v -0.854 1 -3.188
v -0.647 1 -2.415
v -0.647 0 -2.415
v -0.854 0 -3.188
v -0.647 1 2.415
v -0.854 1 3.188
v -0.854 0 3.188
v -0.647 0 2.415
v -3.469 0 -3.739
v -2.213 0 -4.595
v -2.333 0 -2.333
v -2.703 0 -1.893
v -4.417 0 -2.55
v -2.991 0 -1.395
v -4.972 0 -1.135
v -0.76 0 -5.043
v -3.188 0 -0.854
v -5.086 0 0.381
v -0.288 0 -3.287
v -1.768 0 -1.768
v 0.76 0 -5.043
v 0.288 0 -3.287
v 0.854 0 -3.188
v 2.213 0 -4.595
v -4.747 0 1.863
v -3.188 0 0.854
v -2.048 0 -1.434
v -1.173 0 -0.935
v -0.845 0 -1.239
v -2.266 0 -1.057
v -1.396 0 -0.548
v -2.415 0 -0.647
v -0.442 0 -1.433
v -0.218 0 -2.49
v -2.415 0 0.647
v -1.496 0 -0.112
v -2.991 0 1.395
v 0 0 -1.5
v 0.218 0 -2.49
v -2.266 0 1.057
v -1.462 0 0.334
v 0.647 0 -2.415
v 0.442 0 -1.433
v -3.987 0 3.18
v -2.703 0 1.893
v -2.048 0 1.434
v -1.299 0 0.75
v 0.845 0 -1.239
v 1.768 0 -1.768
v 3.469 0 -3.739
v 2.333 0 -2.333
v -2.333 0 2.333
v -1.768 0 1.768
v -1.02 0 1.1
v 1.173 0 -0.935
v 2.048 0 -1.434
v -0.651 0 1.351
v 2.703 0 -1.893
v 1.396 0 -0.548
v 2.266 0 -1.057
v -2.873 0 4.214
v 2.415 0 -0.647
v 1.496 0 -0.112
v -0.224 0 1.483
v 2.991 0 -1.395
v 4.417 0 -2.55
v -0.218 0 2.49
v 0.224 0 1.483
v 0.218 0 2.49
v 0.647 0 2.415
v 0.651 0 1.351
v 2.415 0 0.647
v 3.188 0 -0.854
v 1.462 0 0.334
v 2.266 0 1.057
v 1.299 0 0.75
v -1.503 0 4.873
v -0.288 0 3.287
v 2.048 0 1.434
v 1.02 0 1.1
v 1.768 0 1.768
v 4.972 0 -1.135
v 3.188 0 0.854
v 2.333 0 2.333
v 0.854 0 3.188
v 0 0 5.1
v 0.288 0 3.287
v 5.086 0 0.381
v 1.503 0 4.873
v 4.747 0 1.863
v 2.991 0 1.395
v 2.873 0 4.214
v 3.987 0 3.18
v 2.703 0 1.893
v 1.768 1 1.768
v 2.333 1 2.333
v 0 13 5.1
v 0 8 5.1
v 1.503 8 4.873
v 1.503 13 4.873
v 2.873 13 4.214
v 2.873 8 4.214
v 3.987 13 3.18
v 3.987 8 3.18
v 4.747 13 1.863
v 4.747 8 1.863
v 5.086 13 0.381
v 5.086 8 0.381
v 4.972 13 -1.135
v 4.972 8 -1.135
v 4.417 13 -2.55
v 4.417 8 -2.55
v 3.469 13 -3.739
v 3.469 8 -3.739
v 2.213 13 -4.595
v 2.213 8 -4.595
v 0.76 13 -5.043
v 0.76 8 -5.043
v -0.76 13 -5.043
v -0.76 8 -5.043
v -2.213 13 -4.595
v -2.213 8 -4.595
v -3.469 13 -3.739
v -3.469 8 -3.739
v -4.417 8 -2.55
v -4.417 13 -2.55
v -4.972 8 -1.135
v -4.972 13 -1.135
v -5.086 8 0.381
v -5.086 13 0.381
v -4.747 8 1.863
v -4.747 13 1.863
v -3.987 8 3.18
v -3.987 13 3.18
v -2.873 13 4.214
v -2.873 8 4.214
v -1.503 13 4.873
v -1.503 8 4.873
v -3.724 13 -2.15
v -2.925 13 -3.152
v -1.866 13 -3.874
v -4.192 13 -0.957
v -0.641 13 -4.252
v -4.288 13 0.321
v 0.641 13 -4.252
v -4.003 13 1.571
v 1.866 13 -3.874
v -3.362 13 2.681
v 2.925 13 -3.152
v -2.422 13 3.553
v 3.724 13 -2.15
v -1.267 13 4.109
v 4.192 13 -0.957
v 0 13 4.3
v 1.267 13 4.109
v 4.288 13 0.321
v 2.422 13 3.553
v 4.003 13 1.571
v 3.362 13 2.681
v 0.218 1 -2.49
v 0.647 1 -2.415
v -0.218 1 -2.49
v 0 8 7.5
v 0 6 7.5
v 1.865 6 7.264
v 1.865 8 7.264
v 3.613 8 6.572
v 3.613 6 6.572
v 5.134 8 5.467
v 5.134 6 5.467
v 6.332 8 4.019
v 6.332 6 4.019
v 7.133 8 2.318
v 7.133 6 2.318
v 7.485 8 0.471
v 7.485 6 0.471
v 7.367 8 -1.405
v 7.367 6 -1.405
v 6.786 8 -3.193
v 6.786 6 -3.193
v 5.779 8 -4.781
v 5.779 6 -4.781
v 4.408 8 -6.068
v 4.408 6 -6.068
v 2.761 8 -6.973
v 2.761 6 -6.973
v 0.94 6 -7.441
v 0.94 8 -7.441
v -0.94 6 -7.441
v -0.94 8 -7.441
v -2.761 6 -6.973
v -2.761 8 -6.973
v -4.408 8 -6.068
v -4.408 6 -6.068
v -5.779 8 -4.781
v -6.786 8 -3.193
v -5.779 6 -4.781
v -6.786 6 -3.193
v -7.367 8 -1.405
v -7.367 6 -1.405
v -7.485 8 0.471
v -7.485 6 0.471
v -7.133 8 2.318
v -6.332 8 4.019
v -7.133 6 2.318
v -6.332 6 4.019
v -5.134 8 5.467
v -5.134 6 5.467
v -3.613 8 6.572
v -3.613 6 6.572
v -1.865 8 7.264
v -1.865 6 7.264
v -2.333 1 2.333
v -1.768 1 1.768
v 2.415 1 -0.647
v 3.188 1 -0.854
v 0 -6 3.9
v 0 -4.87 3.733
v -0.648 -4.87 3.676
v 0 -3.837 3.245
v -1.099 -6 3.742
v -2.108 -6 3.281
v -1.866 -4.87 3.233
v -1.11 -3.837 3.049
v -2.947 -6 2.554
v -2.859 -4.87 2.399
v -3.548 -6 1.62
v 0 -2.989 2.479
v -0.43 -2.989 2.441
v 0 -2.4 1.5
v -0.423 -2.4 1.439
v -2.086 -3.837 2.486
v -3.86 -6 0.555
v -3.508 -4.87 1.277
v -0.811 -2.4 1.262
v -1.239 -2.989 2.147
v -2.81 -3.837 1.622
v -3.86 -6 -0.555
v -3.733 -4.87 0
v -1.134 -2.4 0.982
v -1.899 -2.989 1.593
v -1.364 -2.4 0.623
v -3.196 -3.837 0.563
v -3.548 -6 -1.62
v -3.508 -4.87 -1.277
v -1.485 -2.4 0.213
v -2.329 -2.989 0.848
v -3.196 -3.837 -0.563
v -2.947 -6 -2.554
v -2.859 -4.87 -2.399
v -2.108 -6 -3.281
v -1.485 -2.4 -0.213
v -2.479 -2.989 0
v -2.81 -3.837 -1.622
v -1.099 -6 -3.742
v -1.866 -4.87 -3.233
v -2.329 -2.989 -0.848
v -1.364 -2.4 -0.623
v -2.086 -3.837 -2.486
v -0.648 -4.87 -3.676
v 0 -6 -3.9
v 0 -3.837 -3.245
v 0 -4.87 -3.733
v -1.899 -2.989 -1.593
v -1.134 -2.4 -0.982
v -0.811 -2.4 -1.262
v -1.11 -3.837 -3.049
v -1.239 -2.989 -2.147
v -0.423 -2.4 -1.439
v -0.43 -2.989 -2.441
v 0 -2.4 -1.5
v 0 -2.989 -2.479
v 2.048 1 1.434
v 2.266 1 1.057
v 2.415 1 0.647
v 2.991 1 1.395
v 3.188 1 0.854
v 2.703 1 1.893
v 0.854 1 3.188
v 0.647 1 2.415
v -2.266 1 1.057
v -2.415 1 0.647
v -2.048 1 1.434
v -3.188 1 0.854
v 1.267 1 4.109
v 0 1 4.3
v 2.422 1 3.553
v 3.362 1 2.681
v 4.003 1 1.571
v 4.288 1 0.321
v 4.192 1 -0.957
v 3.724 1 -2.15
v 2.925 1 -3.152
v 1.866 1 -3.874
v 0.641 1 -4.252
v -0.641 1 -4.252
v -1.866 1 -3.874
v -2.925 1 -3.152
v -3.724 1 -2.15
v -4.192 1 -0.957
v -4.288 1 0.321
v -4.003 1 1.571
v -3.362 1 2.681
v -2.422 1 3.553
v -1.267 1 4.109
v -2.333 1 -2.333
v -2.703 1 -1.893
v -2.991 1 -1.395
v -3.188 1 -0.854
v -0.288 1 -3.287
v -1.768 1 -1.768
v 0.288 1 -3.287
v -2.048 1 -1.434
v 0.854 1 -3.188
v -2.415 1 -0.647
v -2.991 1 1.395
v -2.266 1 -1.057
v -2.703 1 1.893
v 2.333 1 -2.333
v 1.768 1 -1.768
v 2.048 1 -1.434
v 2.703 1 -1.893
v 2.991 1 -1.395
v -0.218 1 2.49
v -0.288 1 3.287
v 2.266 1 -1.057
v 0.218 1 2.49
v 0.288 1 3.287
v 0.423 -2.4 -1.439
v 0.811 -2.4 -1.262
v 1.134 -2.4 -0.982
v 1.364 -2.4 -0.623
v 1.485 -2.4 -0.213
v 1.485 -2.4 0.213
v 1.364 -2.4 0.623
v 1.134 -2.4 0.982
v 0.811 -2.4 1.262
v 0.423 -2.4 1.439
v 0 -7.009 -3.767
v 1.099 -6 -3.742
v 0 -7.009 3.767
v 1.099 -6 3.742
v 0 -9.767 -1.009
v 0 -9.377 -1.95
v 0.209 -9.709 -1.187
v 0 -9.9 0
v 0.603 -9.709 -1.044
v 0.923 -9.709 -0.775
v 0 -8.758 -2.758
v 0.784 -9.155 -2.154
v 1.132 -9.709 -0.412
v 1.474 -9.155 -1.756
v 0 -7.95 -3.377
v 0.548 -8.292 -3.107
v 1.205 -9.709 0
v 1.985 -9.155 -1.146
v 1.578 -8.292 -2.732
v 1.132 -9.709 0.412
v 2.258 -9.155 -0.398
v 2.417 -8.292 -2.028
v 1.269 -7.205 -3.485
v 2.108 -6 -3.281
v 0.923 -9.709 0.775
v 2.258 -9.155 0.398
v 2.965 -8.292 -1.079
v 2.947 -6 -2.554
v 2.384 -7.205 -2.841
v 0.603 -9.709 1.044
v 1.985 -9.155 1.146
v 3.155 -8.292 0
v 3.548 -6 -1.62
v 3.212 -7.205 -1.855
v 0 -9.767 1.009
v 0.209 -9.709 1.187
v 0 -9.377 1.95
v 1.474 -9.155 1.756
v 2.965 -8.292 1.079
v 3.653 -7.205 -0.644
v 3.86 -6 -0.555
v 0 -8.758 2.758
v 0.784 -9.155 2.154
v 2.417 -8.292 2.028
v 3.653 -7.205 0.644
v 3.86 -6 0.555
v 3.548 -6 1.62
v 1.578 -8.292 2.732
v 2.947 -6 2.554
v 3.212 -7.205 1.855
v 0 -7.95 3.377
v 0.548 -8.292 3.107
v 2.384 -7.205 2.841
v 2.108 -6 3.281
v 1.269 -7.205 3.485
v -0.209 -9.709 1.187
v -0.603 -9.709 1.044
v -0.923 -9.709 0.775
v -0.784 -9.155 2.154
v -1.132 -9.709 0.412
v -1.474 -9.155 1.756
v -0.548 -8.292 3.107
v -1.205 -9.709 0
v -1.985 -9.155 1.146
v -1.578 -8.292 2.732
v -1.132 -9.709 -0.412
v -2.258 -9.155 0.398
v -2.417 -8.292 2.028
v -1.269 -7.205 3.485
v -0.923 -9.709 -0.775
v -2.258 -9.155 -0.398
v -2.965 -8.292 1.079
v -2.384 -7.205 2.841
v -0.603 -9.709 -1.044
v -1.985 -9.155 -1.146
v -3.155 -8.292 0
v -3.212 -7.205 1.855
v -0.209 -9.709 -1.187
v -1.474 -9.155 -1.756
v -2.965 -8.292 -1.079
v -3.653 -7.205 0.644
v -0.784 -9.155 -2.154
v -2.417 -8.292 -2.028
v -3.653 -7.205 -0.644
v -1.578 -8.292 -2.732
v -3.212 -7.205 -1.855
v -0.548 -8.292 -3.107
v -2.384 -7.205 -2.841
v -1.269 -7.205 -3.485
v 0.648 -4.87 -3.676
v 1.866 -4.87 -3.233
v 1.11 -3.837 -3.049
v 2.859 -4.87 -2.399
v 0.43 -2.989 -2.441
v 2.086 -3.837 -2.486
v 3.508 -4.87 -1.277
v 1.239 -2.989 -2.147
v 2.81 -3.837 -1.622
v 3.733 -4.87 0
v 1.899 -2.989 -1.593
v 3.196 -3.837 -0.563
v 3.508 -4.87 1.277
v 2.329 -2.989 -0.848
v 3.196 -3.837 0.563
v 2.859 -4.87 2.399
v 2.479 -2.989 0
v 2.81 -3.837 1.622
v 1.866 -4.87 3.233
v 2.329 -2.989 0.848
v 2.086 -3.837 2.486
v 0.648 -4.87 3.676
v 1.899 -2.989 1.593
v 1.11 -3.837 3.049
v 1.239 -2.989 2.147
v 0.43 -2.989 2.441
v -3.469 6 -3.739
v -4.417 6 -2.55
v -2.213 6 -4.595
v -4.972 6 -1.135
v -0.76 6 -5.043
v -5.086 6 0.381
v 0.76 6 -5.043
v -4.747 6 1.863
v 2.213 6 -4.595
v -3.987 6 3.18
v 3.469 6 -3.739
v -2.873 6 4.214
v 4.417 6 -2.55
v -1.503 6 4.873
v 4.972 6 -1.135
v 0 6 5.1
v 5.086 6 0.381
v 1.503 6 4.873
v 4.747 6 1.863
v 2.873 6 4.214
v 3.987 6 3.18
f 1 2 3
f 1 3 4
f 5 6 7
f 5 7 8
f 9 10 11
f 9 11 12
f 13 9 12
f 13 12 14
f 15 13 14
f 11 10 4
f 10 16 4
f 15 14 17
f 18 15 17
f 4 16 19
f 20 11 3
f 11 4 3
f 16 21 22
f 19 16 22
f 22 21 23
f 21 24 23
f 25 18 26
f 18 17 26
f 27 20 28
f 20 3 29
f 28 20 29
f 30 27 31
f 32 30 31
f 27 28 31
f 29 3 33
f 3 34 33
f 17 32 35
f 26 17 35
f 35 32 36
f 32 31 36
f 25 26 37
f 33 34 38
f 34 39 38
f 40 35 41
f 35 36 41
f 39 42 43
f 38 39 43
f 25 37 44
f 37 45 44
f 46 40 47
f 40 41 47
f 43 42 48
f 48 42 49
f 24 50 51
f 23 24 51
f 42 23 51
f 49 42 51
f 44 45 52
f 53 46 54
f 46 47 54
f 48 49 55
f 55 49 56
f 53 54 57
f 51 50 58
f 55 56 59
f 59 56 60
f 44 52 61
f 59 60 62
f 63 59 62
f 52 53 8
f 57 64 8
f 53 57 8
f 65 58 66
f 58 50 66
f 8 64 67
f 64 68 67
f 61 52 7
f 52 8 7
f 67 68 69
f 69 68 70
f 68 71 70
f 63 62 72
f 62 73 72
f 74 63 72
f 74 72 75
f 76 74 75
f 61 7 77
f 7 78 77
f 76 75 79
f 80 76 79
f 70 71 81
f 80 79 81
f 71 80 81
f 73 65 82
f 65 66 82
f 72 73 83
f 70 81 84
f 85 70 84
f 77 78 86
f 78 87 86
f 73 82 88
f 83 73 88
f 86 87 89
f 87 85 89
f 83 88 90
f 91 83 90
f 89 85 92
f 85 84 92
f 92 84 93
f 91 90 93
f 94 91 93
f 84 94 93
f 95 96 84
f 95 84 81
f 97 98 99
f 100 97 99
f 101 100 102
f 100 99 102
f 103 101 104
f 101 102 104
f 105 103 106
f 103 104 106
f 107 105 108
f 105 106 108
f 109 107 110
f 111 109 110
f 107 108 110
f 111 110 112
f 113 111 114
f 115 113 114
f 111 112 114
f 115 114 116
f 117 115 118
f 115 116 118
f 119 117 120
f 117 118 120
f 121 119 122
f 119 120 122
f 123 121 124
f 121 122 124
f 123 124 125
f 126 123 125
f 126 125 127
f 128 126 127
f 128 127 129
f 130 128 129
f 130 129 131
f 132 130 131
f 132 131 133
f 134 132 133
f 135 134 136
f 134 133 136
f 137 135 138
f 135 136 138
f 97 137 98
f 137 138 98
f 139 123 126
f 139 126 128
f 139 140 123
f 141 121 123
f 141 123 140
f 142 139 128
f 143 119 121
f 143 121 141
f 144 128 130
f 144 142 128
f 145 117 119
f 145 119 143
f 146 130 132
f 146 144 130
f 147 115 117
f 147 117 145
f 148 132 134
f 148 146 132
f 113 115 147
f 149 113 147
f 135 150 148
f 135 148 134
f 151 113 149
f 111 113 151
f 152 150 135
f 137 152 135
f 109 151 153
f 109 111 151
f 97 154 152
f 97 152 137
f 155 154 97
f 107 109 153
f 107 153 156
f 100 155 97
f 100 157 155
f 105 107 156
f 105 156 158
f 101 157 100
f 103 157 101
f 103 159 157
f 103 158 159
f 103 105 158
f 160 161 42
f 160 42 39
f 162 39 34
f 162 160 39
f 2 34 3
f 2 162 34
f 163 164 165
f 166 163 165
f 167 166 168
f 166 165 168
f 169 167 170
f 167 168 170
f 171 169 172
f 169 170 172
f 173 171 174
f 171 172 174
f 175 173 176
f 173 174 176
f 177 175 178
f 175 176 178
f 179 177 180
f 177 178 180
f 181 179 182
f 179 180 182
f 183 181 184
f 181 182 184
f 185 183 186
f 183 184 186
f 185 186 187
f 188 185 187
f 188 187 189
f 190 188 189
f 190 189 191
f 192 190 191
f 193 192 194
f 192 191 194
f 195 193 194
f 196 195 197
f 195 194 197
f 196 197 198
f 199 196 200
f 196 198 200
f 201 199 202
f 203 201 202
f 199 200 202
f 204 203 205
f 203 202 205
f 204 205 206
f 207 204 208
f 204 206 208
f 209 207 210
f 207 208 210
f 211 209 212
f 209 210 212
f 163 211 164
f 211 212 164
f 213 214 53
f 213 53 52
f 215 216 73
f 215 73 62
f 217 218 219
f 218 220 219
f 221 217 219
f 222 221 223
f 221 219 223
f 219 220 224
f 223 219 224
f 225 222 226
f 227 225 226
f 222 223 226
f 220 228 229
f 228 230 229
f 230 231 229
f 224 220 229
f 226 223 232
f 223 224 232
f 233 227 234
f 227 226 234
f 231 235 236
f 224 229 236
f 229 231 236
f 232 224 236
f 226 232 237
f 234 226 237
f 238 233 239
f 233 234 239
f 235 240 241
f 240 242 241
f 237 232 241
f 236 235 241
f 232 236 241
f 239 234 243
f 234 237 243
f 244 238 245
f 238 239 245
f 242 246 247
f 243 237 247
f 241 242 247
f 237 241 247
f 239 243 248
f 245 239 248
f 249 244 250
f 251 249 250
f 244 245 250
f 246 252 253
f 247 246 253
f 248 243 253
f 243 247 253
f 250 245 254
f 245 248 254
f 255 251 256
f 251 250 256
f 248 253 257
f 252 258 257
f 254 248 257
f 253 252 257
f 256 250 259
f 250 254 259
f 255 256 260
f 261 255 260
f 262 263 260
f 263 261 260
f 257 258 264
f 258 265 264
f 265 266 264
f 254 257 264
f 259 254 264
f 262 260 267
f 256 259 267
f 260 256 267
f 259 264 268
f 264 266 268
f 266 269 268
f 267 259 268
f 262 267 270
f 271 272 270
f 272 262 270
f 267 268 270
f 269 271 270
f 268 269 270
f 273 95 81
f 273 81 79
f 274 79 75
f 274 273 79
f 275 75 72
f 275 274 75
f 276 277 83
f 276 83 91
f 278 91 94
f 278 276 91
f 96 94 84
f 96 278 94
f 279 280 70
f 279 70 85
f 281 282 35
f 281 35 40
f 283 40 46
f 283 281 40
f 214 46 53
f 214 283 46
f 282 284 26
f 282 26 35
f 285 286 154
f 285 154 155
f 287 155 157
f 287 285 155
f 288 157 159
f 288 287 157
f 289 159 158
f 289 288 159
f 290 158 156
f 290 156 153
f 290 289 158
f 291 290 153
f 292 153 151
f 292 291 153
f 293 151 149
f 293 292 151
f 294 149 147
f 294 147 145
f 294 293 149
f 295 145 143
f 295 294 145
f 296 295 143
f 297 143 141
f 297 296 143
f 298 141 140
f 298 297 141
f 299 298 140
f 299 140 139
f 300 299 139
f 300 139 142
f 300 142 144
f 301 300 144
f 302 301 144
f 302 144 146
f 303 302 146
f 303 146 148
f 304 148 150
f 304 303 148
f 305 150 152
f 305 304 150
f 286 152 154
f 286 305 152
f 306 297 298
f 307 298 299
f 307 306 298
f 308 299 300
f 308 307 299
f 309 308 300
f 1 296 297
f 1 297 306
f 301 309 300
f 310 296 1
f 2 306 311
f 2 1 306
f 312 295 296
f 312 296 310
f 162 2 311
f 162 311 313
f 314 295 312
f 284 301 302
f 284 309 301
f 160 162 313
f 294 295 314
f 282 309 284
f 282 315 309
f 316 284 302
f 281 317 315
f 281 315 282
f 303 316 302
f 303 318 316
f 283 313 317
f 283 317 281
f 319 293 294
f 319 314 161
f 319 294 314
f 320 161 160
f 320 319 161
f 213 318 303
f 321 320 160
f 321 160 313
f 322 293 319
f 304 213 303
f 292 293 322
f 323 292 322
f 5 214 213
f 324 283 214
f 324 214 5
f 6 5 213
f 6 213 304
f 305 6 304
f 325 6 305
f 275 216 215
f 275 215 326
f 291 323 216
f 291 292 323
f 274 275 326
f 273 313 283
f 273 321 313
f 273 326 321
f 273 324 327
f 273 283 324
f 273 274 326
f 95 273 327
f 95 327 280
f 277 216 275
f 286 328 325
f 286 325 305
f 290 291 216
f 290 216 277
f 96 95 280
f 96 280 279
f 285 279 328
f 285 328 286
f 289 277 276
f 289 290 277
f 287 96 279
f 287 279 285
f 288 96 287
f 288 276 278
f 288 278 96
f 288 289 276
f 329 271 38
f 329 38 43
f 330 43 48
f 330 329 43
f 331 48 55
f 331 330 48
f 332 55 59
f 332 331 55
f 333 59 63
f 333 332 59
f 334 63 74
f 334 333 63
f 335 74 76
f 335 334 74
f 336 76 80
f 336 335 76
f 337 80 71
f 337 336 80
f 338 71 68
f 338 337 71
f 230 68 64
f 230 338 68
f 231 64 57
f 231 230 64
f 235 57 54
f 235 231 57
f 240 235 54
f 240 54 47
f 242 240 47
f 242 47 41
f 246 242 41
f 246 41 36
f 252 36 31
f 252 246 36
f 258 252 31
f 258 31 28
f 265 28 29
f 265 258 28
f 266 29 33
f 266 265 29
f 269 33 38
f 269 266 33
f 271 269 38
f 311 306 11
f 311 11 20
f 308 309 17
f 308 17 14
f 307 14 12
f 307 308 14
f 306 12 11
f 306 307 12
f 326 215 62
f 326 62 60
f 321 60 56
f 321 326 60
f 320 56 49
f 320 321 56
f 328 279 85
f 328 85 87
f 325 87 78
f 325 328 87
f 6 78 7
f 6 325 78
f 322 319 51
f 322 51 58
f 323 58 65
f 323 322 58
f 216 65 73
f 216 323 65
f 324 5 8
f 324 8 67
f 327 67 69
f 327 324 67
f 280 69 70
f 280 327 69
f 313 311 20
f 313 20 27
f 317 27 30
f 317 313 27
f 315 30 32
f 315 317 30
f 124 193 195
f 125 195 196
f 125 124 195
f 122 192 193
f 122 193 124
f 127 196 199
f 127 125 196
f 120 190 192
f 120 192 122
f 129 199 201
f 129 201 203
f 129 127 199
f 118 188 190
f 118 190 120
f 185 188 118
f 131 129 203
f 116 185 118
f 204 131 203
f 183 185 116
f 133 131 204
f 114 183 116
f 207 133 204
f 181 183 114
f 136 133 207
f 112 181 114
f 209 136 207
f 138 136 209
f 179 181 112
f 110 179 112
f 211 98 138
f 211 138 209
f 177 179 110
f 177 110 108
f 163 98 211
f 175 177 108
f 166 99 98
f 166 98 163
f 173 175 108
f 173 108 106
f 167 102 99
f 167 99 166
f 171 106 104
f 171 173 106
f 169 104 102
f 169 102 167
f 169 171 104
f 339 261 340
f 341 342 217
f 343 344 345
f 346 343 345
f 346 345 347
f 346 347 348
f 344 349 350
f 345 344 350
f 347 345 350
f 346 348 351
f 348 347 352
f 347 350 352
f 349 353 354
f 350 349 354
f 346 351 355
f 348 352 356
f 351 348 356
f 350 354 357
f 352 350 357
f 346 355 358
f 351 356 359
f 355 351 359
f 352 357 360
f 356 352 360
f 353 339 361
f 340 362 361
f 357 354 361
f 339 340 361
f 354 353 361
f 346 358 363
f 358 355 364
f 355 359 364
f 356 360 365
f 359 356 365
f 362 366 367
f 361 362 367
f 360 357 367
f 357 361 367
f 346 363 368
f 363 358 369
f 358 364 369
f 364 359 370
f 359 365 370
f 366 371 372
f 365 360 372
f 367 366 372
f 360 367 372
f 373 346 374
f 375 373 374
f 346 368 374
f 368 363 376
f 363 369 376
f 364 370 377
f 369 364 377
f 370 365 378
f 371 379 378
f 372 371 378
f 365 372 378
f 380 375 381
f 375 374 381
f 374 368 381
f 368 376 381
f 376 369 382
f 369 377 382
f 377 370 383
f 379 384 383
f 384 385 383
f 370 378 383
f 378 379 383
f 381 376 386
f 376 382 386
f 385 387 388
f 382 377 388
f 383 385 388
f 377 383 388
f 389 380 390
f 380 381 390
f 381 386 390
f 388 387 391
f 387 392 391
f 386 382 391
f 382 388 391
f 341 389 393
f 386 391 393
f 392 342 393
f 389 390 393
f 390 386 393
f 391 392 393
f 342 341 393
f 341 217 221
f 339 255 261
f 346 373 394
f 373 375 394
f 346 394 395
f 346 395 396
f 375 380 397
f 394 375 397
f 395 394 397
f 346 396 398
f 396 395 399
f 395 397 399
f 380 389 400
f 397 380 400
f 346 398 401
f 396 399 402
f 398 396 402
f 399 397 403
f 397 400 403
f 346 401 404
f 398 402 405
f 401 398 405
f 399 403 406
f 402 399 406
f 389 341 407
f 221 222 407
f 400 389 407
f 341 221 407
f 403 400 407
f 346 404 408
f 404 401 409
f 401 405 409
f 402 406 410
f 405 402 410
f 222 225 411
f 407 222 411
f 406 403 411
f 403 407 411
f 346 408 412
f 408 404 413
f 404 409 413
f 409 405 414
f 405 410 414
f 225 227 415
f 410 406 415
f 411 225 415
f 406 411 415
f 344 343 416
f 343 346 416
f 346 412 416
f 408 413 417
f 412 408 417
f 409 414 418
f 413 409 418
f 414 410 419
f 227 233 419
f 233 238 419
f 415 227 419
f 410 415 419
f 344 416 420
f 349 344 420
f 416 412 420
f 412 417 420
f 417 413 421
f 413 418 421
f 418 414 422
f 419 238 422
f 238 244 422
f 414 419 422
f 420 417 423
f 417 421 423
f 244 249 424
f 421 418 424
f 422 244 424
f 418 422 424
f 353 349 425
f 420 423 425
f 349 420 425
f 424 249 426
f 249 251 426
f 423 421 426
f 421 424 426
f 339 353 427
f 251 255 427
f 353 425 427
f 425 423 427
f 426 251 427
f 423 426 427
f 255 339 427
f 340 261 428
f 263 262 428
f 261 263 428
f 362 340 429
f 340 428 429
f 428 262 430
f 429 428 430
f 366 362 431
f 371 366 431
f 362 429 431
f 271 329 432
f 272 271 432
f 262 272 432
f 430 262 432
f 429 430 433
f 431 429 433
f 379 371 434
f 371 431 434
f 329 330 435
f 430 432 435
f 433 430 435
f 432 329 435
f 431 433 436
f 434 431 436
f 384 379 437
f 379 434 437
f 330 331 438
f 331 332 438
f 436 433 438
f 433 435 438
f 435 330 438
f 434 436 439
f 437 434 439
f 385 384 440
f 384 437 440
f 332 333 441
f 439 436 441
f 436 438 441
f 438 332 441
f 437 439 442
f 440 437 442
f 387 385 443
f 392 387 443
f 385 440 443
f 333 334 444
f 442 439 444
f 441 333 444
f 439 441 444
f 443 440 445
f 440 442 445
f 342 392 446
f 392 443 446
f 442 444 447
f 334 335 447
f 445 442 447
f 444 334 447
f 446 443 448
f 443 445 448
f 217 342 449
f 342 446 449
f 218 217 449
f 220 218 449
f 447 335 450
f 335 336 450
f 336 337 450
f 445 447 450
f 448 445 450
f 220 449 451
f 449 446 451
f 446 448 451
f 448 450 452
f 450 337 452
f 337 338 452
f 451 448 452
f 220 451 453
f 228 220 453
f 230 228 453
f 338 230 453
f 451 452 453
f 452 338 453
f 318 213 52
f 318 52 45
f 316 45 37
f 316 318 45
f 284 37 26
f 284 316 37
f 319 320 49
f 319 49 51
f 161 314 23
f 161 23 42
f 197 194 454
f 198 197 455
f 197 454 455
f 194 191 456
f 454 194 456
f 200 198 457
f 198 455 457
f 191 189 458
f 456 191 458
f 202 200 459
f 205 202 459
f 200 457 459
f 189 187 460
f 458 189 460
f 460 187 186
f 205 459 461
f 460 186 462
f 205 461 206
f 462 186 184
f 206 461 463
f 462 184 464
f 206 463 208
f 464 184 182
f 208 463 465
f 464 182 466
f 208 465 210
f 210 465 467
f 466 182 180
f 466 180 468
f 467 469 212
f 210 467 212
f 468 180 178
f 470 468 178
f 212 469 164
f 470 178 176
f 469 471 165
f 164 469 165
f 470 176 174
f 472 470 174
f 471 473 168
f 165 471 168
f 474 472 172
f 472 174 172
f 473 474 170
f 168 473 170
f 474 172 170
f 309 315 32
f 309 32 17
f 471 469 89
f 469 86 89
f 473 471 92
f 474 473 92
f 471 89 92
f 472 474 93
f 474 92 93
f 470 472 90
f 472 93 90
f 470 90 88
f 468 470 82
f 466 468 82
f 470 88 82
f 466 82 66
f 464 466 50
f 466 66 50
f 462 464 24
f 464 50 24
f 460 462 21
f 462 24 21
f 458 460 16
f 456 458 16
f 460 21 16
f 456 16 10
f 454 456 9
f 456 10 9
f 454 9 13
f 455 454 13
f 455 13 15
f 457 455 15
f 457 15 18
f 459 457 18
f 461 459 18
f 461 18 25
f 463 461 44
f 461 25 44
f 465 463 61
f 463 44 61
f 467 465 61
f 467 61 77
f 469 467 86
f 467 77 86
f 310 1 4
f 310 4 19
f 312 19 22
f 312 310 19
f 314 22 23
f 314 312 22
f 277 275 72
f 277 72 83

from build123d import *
from build123d.topology import SkipClean

# Parameters (mm, degrees)
SKETCH2_R           = 5.1
BOSS_EXTRUDE1_DEPTH = 1
SKETCH3_R           = 5.1
SKETCH3_R_2         = 4.3
BOSS_EXTRUDE2_DEPTH = 12
CUT_EXTRUDE2_DEPTH  = 1
SKETCH7_R           = 7.5
SKETCH7_R_2         = 5.1
BOSS_EXTRUDE4_DEPTH = 2


with BuildPart() as part:
    # Sketch2 → Boss-Extrude1 (new body)
    with BuildSketch(Plane(origin=(0, 0, 0), x_dir=(1, 0, 0), z_dir=(0, 1, 0))):
        with Locations(Location((0, 0, 0), (0, 0, 270))):
            Circle(SKETCH2_R)
    extrude(amount=BOSS_EXTRUDE1_DEPTH)

    # Sketch3 → Boss-Extrude2 (add)
    with BuildSketch(Plane(origin=(0, 1, 0), x_dir=(1, 0, 0), z_dir=(0, 1, 0))):
        with Locations(Location((0, 0, 0), (0, 0, 270))):
            Circle(SKETCH3_R)
        with Locations(Location((0, 0, 0), (0, 0, 270))):
            Circle(SKETCH3_R_2, mode=Mode.SUBTRACT)
    extrude(amount=BOSS_EXTRUDE2_DEPTH)

    # Sketch6 → Cut-Extrude2 (cut)
    with BuildSketch(Plane(origin=(0, 1, 0), x_dir=(1, 0, 0), z_dir=(0, 1, 0))):
        with BuildLine():
            ThreePointArc((-1.767766953, 1.767766953), (-2.165063509, 1.25), (-2.414814566, 0.647047613))
            Line((-2.414814566, 0.647047613), (-3.187555227, 0.854102849))
            ThreePointArc((-3.187555227, 0.854102849), (-2.857883832, 1.65), (-2.333452378, 2.333452378))
            Line((-2.333452378, 2.333452378), (-1.767766953, 1.767766953))
        make_face()
        with BuildLine():
            ThreePointArc((2.414814566, 0.647047613), (2.165063509, 1.25), (1.767766953, 1.767766953))
            Line((1.767766953, 1.767766953), (2.333452378, 2.333452378))
            ThreePointArc((2.333452378, 2.333452378), (2.857883832, 1.65), (3.187555227, 0.854102849))
            Line((3.187555227, 0.854102849), (2.414814566, 0.647047613))
        make_face()
        with BuildLine():
            ThreePointArc((1.767766953, -1.767766953), (2.165063509, -1.25), (2.414814566, -0.647047613))
            Line((2.414814566, -0.647047613), (3.187555227, -0.854102849))
            ThreePointArc((3.187555227, -0.854102849), (2.857883832, -1.65), (2.333452378, -2.333452378))
            Line((2.333452378, -2.333452378), (1.767766953, -1.767766953))
        make_face()
        with BuildLine():
            ThreePointArc((-0.647047613, -2.414814566), (0, -2.5), (0.647047613, -2.414814566))
            Line((0.647047613, -2.414814566), (0.854102849, -3.187555227))
            ThreePointArc((0.854102849, -3.187555227), (0, -3.3), (-0.854102849, -3.187555227))
            Line((-0.854102849, -3.187555227), (-0.647047613, -2.414814566))
        make_face()
        with BuildLine():
            ThreePointArc((-2.414814566, -0.647047613), (-2.165063509, -1.25), (-1.767766953, -1.767766953))
            Line((-1.767766953, -1.767766953), (-2.333452378, -2.333452378))
            ThreePointArc((-2.333452378, -2.333452378), (-2.857883832, -1.65), (-3.187555227, -0.854102849))
            Line((-3.187555227, -0.854102849), (-2.414814566, -0.647047613))
        make_face()
        with BuildLine():
            ThreePointArc((0.647047613, 2.414814566), (0, 2.5), (-0.647047613, 2.414814566))
            Line((-0.647047613, 2.414814566), (-0.854102849, 3.187555227))
            ThreePointArc((-0.854102849, 3.187555227), (0, 3.3), (0.854102849, 3.187555227))
            Line((0.854102849, 3.187555227), (0.647047613, 2.414814566))
        make_face()
    extrude(amount=-CUT_EXTRUDE2_DEPTH, mode=Mode.SUBTRACT)

    # Sketch7 → Boss-Extrude4 (add)
    with BuildSketch(Plane(origin=(0, 6, 0), x_dir=(1, 0, 0), z_dir=(0, 1, 0))):
        with Locations(Location((0, 0, 0), (0, 0, 270))):
            Circle(SKETCH7_R)
        with Locations(Location((0, 0, 0), (0, 0, 270))):
            Circle(SKETCH7_R_2, mode=Mode.SUBTRACT)
    extrude(amount=BOSS_EXTRUDE4_DEPTH)

    # Sketch10 → Revolve1 (revolve)
    with SkipClean():  # the faces are left unmerged after this step: merging them gives an invalid solid
        with BuildSketch(Plane(origin=(0, 0, 0), x_dir=(0, 0, -1), z_dir=(1, 0, 0)), mode=Mode.PRIVATE) as revolve1_sk:
            with BuildLine():
                ThreePointArc((1.5, -2.4), (0.764852927, -2.175735365), (0, -2.1))
                Line((0, -2.1), (0, -6))
                Line((0, -6), (0, -9.9))
                ThreePointArc((0, -9.9), (2.757716447, -8.757716447), (3.9, -6))
                ThreePointArc((3.9, -6), (3.244996148, -3.836669235), (1.5, -2.4))
            make_face()
            with BuildLine():
                Line((0, -6), (0, -2.1))
                ThreePointArc((0, -2.1), (-0.764852927, -2.175735365), (-1.5, -2.4))
                ThreePointArc((-1.5, -2.4), (-3.824264635, -6.764852927), (0, -9.9))
                Line((0, -9.9), (0, -6))
            make_face()
            with BuildLine():
                Line((0, -2.1), (0, 0))
                Line((0, 0), (-1.5, 0))
                Line((-1.5, 0), (-1.5, -2.4))
                ThreePointArc((-1.5, -2.4), (-0.764852927, -2.175735365), (0, -2.1))
            make_face()
        revolve(revolve1_sk.sketch.rotate(Axis((0, -2.1, 0), (0, -1, 0)), 180), axis=Axis((0, -2.1, 0), (0, -1, 0)))


solid = part.part
